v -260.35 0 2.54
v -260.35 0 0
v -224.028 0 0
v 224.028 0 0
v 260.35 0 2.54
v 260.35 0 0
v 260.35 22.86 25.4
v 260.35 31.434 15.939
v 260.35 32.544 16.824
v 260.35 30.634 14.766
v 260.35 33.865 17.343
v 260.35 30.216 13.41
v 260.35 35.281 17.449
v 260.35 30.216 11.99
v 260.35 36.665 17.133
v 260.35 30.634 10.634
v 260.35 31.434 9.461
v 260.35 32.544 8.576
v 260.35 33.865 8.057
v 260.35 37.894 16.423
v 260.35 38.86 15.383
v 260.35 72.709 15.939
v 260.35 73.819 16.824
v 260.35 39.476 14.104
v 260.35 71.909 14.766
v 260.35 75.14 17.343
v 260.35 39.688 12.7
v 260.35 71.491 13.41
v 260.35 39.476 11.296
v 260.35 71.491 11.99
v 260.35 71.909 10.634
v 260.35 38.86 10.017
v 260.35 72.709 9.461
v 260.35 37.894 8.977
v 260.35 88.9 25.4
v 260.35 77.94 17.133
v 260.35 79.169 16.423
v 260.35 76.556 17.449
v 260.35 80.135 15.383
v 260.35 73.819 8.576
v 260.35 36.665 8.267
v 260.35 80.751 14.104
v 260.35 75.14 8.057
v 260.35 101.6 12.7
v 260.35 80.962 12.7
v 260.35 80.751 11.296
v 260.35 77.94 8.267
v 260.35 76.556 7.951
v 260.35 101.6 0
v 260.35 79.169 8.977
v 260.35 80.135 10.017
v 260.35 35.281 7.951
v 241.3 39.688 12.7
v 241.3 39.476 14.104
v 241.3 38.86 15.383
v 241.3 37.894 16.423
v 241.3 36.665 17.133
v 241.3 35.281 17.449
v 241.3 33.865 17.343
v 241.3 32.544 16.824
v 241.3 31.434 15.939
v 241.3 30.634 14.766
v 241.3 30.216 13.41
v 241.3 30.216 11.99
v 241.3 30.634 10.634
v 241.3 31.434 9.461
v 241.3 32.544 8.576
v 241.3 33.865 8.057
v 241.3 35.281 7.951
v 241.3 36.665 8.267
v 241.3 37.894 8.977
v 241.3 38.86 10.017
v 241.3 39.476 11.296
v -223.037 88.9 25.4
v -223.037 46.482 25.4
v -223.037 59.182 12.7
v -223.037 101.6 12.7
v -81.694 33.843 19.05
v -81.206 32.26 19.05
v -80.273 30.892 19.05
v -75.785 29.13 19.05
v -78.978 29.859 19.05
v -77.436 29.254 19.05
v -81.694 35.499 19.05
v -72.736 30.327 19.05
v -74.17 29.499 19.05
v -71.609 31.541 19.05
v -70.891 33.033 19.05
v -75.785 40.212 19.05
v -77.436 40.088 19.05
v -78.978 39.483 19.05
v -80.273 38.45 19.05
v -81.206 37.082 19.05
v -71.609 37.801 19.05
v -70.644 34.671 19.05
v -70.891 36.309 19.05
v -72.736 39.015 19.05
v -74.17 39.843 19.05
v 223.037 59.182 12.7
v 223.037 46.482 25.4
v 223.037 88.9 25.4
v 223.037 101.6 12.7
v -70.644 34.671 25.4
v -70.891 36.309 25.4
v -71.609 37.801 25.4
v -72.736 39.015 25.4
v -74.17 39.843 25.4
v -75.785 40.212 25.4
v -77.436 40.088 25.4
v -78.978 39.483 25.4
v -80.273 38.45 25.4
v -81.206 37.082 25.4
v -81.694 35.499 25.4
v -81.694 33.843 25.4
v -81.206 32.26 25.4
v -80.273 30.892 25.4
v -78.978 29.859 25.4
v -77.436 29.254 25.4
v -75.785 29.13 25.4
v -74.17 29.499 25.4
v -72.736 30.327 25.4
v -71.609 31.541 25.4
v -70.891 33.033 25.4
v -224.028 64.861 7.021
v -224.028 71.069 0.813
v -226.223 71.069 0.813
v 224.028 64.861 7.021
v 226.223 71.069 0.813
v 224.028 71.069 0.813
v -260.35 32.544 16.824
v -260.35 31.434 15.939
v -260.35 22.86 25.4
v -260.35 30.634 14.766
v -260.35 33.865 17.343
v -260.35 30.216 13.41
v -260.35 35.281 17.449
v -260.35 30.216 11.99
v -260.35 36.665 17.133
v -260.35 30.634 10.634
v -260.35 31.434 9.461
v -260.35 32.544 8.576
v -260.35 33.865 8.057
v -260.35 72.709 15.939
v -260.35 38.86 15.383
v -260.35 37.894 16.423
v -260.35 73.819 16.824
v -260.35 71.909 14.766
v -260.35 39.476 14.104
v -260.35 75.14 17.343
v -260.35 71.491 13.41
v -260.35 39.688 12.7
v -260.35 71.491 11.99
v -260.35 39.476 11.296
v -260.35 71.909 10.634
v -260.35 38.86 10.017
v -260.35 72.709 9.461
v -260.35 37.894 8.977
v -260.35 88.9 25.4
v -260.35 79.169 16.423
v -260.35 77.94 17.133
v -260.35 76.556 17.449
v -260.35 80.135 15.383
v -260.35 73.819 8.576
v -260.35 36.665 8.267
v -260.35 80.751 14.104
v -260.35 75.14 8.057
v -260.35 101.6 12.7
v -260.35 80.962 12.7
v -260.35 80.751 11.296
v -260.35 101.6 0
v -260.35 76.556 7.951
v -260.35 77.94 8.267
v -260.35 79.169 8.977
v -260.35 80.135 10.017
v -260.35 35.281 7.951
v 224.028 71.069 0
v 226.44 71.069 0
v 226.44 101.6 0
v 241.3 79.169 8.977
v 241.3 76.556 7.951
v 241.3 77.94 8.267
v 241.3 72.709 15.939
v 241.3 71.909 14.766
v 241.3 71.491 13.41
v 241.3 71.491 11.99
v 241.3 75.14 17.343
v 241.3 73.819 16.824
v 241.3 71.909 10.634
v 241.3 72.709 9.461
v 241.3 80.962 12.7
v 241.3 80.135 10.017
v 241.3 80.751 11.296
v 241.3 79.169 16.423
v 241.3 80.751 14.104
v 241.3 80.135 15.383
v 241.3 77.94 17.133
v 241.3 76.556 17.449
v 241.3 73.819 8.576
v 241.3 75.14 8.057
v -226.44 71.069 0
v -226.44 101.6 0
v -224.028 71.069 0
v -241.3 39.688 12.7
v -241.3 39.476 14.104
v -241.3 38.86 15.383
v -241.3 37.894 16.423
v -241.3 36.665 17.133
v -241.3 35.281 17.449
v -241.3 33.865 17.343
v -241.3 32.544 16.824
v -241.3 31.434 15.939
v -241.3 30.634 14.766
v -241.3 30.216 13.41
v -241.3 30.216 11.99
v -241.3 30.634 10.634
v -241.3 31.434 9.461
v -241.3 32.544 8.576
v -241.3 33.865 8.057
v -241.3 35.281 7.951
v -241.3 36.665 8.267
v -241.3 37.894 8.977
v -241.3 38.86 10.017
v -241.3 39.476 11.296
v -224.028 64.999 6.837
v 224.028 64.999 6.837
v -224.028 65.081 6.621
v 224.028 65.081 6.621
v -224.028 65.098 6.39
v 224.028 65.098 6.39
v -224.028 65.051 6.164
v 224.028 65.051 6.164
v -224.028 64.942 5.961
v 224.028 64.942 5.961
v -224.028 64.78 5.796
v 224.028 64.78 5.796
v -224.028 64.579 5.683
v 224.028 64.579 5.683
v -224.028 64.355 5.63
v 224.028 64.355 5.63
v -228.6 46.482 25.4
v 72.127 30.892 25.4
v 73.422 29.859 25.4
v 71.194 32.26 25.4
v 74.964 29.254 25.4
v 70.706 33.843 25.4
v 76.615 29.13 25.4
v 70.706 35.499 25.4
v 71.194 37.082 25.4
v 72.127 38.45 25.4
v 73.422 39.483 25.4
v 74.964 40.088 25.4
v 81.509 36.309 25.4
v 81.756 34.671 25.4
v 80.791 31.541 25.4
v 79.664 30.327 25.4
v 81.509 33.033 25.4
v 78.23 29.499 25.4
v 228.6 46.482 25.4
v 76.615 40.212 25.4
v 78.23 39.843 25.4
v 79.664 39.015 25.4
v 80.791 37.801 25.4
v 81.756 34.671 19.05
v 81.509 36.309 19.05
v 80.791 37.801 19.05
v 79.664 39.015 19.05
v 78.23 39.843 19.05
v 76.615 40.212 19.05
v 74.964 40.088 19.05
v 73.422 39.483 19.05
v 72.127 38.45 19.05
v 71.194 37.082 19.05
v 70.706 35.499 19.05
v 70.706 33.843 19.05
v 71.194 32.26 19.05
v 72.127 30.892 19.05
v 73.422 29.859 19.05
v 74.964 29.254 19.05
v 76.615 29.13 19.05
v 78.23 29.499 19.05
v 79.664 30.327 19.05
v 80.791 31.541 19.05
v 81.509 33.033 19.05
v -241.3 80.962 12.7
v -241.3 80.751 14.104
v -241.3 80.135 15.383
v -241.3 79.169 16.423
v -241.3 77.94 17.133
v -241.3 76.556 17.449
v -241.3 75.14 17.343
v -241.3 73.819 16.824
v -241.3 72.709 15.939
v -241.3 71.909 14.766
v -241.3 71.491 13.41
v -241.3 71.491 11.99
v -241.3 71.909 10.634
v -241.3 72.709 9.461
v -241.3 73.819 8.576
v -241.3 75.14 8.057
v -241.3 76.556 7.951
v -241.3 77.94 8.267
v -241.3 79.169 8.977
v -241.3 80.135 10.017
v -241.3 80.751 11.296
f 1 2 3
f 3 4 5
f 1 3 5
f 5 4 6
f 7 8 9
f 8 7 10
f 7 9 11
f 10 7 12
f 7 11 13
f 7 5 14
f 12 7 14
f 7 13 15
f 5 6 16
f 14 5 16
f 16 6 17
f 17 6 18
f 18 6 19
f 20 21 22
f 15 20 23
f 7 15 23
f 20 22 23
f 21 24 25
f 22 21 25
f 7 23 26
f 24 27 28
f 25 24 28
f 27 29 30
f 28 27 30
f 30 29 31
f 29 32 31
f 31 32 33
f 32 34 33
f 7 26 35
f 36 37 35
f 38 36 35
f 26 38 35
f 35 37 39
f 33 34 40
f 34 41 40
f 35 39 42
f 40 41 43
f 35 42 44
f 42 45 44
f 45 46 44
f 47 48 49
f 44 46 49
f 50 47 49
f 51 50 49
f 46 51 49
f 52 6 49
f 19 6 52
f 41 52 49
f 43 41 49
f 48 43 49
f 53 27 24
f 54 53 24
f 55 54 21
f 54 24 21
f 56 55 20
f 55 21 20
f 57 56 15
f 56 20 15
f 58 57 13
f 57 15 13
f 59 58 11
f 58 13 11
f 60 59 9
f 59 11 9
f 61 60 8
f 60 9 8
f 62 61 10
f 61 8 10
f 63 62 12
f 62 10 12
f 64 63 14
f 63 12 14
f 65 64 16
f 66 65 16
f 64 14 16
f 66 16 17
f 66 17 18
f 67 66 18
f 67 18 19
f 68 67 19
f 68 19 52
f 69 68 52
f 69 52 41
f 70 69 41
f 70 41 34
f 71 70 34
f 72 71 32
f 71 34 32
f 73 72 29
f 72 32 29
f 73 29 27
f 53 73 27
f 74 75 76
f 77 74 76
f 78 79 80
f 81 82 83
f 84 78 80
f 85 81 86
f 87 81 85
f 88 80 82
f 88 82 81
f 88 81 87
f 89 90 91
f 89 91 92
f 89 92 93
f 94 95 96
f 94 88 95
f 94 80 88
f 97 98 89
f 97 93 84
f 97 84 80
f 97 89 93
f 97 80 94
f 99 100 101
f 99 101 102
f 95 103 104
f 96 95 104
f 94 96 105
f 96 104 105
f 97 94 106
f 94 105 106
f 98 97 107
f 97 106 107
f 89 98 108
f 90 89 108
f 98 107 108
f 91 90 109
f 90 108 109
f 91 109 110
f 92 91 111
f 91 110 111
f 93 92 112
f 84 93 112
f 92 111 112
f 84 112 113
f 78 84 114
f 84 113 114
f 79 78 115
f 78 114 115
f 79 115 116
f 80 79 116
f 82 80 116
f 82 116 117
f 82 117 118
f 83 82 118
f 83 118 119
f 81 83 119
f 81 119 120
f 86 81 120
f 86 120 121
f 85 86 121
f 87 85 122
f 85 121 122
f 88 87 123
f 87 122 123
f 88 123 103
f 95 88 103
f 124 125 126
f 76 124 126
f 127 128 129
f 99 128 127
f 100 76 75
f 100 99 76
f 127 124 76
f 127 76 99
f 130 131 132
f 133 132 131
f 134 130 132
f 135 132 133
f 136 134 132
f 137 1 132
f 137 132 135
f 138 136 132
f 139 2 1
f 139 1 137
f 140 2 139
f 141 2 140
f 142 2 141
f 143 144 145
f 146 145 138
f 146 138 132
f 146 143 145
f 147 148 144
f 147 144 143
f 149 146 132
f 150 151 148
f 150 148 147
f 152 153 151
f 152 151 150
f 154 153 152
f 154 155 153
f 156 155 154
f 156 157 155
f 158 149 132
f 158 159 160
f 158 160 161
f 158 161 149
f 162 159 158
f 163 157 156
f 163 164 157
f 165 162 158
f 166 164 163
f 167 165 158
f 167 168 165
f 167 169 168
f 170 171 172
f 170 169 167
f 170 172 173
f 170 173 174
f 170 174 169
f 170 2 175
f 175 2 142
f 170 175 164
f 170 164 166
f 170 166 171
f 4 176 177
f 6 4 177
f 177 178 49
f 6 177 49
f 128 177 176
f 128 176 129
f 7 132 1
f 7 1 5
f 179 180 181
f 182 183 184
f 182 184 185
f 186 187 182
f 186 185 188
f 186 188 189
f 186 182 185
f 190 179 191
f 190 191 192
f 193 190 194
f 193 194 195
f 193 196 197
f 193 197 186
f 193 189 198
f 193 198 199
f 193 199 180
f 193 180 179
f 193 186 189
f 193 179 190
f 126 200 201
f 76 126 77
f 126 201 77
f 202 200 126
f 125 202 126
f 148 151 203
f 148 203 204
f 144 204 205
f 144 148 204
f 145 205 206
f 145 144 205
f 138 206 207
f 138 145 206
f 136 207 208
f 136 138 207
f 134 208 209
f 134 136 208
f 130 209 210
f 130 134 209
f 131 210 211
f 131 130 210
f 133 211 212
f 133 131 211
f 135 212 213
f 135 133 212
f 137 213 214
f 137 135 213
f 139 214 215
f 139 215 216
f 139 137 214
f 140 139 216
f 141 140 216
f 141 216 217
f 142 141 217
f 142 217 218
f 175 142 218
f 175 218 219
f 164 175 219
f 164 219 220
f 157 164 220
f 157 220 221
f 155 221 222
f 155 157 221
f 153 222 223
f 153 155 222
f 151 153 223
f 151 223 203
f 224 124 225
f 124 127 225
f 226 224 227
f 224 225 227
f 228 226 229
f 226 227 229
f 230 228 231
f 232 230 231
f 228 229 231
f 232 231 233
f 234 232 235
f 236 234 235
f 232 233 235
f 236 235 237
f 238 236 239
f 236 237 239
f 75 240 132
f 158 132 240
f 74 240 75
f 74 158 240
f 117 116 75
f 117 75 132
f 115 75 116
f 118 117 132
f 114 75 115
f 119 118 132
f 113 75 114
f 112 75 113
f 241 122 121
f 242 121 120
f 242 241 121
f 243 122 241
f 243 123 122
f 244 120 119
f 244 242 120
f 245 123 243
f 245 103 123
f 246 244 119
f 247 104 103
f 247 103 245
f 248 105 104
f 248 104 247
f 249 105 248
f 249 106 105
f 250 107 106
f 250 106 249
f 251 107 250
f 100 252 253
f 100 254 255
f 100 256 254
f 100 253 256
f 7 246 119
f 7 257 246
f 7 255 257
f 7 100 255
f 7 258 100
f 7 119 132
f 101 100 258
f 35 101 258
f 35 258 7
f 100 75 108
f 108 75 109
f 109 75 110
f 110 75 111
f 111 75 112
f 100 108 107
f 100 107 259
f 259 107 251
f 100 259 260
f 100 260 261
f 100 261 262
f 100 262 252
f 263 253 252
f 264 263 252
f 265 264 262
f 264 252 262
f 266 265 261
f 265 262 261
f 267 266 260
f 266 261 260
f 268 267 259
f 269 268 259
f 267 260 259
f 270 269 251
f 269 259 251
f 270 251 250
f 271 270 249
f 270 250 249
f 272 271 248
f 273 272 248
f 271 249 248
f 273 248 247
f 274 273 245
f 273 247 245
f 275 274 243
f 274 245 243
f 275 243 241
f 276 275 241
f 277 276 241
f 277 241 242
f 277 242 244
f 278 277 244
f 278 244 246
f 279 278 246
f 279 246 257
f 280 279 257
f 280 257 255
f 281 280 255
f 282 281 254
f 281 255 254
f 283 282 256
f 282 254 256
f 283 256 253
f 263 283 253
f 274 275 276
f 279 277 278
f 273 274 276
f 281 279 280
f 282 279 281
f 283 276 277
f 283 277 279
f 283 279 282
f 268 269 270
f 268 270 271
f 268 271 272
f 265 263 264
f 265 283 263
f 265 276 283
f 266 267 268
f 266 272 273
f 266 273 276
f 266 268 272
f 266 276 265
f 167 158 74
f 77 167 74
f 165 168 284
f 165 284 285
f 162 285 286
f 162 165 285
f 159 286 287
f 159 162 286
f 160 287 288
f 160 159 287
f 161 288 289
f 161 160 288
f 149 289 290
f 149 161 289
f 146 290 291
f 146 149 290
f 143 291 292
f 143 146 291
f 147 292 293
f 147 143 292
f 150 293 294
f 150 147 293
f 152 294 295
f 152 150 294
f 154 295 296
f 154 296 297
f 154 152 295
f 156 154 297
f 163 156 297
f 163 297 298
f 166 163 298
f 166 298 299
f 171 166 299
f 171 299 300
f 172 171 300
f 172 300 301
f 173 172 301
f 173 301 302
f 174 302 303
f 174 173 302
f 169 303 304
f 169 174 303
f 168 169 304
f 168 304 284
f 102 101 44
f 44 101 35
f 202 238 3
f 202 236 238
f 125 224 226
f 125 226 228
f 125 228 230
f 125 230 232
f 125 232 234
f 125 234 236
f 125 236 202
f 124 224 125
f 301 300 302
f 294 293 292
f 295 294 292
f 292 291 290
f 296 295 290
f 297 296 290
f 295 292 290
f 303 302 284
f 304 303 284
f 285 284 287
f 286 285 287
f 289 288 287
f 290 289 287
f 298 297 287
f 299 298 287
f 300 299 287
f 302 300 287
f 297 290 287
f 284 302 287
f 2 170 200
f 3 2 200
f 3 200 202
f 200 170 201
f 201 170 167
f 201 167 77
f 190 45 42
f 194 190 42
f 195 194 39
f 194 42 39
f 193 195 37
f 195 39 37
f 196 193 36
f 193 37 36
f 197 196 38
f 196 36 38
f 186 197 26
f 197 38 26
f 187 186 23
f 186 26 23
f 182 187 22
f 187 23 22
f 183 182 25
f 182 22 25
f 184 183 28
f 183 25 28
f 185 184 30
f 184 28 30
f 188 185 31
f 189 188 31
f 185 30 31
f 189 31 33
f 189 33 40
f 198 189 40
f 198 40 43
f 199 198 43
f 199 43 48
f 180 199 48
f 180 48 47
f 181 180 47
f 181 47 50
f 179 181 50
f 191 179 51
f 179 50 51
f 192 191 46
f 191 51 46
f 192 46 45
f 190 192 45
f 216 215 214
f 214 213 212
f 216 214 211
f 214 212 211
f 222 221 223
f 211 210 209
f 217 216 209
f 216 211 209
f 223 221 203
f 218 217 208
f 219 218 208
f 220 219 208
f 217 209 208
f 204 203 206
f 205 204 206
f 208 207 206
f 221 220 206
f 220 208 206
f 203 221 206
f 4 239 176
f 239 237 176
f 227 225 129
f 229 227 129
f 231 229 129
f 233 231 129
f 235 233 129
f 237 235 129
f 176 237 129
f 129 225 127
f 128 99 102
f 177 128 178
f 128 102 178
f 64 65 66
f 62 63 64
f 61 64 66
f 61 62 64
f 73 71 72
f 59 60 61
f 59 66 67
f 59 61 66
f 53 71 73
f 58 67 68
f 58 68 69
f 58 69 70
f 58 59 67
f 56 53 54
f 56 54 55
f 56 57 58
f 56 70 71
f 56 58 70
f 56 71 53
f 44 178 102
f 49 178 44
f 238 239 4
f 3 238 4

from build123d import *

# Parameters (mm, degrees)
F0_W      = 520.7
F0_H      = 101.6
F1_DEPTH  = 25.4
F2_SIZE   = 22.86
F3_W      = 446.0748
F3_H      = 55.118
F4_DEPTH  = 25.401
F6_DEPTH  = 55.118
F7_SIZE   = 12.7
F9_DEPTH  = 228.6
F10_R     = 5.55625
F11_DEPTH = 6.35
F12_R     = 4.7625
F13_DEPTH = 19.05
F15_DEPTH = 224.028
F16_R     = 0.81661


# Not quite as in the source:
# - a pattern or mirror of a feature is missing from the dataset's text; its kind, count and spacing are read off the source's solid


with BuildPart() as f1:
    # F0 (on Top) → F1 (new body)
    with BuildSketch(Plane.XY):
        with Locations((0, 50.8)):
            Rectangle(F0_W, F0_H)
    extrude(amount=F1_DEPTH)

    # F2
    f2_edges = [f1.edges().sort_by_distance(p)[0] for p in [
        (0, 0, 25.4),
    ]]
    chamfer(f2_edges, length=F2_SIZE)

    # F3 (on face) → F4 (cut, through all)
    with BuildSketch(Plane.XY.offset(25.4)):
        with Locations((0, 74.041)):
            Rectangle(F3_W, F3_H)
    extrude(amount=-F4_DEPTH, mode=Mode.SUBTRACT)

    # F5 (on face) → F6 (cut, through all)
    with BuildSketch(Plane(origin=(0, 101.6, 0), x_dir=(-1, 0, 0), z_dir=(0, 1, 0))):
        Polygon((-223.0374, 0), (-223.0374, 12.7), (-226.4403547439, 0), align=None)
        Polygon((223.0374, 0), (226.4403547439, 0), (223.0374, 12.7), align=None)
    extrude(amount=-F6_DEPTH, mode=Mode.SUBTRACT)

    # F7
    f7_edges = [f1.edges().sort_by_distance(p)[0] for p in [
        (241.6937, 101.6, 25.4),
        (-241.6937, 101.6, 25.4),
    ]]
    chamfer(f7_edges, length=F7_SIZE)

    # F8 (on Right) → F9 (join, symmetric)
    with BuildSketch(Plane.YZ):
        Polygon((71.0692, 0.8128), (46.482, 25.4), (46.482, 0), (71.0692, 0), align=None)
    extrude(amount=F9_DEPTH, both=True)

    # F10 (on face) → F11 (cut)
    with BuildSketch(Plane.XY.offset(25.4)):
        with Locations((76.2, 34.671)):
            Circle(F10_R)
        with Locations((-76.2, 34.671)):
            Circle(F10_R)
    extrude(amount=-F11_DEPTH, mode=Mode.SUBTRACT)

    # F12 (on face) → F13 (cut)
    with BuildSketch(Plane.YZ.offset(260.35)):
        with Locations((34.925, 12.7)):
            Circle(F12_R)
        with Locations((76.2, 12.7)):
            Circle(F12_R)
    f13 = extrude(amount=-F13_DEPTH, mode=Mode.SUBTRACT)

    # F13_copies: F13 across plane
    add(f13.mirror(Plane(origin=(0, 0, 0), x_dir=(0, 0, -1), z_dir=(-1, 0, 0))), mode=Mode.SUBTRACT)

    # F14 (on Right) → F15 (cut, symmetric)
    with BuildSketch(Plane.YZ):
        Polygon((106.9563822457, 9.3574709382), (0, 0), (107.775054872, 0), align=None)
    extrude(amount=F15_DEPTH, both=True, mode=Mode.SUBTRACT)

    # F16
    f16_edges = [f1.edges().sort_by_distance(p)[0] for p in [
        (0, 66.09908, 5.78292),
    ]]
    fillet(f16_edges, radius=F16_R)


solid = f1.part
